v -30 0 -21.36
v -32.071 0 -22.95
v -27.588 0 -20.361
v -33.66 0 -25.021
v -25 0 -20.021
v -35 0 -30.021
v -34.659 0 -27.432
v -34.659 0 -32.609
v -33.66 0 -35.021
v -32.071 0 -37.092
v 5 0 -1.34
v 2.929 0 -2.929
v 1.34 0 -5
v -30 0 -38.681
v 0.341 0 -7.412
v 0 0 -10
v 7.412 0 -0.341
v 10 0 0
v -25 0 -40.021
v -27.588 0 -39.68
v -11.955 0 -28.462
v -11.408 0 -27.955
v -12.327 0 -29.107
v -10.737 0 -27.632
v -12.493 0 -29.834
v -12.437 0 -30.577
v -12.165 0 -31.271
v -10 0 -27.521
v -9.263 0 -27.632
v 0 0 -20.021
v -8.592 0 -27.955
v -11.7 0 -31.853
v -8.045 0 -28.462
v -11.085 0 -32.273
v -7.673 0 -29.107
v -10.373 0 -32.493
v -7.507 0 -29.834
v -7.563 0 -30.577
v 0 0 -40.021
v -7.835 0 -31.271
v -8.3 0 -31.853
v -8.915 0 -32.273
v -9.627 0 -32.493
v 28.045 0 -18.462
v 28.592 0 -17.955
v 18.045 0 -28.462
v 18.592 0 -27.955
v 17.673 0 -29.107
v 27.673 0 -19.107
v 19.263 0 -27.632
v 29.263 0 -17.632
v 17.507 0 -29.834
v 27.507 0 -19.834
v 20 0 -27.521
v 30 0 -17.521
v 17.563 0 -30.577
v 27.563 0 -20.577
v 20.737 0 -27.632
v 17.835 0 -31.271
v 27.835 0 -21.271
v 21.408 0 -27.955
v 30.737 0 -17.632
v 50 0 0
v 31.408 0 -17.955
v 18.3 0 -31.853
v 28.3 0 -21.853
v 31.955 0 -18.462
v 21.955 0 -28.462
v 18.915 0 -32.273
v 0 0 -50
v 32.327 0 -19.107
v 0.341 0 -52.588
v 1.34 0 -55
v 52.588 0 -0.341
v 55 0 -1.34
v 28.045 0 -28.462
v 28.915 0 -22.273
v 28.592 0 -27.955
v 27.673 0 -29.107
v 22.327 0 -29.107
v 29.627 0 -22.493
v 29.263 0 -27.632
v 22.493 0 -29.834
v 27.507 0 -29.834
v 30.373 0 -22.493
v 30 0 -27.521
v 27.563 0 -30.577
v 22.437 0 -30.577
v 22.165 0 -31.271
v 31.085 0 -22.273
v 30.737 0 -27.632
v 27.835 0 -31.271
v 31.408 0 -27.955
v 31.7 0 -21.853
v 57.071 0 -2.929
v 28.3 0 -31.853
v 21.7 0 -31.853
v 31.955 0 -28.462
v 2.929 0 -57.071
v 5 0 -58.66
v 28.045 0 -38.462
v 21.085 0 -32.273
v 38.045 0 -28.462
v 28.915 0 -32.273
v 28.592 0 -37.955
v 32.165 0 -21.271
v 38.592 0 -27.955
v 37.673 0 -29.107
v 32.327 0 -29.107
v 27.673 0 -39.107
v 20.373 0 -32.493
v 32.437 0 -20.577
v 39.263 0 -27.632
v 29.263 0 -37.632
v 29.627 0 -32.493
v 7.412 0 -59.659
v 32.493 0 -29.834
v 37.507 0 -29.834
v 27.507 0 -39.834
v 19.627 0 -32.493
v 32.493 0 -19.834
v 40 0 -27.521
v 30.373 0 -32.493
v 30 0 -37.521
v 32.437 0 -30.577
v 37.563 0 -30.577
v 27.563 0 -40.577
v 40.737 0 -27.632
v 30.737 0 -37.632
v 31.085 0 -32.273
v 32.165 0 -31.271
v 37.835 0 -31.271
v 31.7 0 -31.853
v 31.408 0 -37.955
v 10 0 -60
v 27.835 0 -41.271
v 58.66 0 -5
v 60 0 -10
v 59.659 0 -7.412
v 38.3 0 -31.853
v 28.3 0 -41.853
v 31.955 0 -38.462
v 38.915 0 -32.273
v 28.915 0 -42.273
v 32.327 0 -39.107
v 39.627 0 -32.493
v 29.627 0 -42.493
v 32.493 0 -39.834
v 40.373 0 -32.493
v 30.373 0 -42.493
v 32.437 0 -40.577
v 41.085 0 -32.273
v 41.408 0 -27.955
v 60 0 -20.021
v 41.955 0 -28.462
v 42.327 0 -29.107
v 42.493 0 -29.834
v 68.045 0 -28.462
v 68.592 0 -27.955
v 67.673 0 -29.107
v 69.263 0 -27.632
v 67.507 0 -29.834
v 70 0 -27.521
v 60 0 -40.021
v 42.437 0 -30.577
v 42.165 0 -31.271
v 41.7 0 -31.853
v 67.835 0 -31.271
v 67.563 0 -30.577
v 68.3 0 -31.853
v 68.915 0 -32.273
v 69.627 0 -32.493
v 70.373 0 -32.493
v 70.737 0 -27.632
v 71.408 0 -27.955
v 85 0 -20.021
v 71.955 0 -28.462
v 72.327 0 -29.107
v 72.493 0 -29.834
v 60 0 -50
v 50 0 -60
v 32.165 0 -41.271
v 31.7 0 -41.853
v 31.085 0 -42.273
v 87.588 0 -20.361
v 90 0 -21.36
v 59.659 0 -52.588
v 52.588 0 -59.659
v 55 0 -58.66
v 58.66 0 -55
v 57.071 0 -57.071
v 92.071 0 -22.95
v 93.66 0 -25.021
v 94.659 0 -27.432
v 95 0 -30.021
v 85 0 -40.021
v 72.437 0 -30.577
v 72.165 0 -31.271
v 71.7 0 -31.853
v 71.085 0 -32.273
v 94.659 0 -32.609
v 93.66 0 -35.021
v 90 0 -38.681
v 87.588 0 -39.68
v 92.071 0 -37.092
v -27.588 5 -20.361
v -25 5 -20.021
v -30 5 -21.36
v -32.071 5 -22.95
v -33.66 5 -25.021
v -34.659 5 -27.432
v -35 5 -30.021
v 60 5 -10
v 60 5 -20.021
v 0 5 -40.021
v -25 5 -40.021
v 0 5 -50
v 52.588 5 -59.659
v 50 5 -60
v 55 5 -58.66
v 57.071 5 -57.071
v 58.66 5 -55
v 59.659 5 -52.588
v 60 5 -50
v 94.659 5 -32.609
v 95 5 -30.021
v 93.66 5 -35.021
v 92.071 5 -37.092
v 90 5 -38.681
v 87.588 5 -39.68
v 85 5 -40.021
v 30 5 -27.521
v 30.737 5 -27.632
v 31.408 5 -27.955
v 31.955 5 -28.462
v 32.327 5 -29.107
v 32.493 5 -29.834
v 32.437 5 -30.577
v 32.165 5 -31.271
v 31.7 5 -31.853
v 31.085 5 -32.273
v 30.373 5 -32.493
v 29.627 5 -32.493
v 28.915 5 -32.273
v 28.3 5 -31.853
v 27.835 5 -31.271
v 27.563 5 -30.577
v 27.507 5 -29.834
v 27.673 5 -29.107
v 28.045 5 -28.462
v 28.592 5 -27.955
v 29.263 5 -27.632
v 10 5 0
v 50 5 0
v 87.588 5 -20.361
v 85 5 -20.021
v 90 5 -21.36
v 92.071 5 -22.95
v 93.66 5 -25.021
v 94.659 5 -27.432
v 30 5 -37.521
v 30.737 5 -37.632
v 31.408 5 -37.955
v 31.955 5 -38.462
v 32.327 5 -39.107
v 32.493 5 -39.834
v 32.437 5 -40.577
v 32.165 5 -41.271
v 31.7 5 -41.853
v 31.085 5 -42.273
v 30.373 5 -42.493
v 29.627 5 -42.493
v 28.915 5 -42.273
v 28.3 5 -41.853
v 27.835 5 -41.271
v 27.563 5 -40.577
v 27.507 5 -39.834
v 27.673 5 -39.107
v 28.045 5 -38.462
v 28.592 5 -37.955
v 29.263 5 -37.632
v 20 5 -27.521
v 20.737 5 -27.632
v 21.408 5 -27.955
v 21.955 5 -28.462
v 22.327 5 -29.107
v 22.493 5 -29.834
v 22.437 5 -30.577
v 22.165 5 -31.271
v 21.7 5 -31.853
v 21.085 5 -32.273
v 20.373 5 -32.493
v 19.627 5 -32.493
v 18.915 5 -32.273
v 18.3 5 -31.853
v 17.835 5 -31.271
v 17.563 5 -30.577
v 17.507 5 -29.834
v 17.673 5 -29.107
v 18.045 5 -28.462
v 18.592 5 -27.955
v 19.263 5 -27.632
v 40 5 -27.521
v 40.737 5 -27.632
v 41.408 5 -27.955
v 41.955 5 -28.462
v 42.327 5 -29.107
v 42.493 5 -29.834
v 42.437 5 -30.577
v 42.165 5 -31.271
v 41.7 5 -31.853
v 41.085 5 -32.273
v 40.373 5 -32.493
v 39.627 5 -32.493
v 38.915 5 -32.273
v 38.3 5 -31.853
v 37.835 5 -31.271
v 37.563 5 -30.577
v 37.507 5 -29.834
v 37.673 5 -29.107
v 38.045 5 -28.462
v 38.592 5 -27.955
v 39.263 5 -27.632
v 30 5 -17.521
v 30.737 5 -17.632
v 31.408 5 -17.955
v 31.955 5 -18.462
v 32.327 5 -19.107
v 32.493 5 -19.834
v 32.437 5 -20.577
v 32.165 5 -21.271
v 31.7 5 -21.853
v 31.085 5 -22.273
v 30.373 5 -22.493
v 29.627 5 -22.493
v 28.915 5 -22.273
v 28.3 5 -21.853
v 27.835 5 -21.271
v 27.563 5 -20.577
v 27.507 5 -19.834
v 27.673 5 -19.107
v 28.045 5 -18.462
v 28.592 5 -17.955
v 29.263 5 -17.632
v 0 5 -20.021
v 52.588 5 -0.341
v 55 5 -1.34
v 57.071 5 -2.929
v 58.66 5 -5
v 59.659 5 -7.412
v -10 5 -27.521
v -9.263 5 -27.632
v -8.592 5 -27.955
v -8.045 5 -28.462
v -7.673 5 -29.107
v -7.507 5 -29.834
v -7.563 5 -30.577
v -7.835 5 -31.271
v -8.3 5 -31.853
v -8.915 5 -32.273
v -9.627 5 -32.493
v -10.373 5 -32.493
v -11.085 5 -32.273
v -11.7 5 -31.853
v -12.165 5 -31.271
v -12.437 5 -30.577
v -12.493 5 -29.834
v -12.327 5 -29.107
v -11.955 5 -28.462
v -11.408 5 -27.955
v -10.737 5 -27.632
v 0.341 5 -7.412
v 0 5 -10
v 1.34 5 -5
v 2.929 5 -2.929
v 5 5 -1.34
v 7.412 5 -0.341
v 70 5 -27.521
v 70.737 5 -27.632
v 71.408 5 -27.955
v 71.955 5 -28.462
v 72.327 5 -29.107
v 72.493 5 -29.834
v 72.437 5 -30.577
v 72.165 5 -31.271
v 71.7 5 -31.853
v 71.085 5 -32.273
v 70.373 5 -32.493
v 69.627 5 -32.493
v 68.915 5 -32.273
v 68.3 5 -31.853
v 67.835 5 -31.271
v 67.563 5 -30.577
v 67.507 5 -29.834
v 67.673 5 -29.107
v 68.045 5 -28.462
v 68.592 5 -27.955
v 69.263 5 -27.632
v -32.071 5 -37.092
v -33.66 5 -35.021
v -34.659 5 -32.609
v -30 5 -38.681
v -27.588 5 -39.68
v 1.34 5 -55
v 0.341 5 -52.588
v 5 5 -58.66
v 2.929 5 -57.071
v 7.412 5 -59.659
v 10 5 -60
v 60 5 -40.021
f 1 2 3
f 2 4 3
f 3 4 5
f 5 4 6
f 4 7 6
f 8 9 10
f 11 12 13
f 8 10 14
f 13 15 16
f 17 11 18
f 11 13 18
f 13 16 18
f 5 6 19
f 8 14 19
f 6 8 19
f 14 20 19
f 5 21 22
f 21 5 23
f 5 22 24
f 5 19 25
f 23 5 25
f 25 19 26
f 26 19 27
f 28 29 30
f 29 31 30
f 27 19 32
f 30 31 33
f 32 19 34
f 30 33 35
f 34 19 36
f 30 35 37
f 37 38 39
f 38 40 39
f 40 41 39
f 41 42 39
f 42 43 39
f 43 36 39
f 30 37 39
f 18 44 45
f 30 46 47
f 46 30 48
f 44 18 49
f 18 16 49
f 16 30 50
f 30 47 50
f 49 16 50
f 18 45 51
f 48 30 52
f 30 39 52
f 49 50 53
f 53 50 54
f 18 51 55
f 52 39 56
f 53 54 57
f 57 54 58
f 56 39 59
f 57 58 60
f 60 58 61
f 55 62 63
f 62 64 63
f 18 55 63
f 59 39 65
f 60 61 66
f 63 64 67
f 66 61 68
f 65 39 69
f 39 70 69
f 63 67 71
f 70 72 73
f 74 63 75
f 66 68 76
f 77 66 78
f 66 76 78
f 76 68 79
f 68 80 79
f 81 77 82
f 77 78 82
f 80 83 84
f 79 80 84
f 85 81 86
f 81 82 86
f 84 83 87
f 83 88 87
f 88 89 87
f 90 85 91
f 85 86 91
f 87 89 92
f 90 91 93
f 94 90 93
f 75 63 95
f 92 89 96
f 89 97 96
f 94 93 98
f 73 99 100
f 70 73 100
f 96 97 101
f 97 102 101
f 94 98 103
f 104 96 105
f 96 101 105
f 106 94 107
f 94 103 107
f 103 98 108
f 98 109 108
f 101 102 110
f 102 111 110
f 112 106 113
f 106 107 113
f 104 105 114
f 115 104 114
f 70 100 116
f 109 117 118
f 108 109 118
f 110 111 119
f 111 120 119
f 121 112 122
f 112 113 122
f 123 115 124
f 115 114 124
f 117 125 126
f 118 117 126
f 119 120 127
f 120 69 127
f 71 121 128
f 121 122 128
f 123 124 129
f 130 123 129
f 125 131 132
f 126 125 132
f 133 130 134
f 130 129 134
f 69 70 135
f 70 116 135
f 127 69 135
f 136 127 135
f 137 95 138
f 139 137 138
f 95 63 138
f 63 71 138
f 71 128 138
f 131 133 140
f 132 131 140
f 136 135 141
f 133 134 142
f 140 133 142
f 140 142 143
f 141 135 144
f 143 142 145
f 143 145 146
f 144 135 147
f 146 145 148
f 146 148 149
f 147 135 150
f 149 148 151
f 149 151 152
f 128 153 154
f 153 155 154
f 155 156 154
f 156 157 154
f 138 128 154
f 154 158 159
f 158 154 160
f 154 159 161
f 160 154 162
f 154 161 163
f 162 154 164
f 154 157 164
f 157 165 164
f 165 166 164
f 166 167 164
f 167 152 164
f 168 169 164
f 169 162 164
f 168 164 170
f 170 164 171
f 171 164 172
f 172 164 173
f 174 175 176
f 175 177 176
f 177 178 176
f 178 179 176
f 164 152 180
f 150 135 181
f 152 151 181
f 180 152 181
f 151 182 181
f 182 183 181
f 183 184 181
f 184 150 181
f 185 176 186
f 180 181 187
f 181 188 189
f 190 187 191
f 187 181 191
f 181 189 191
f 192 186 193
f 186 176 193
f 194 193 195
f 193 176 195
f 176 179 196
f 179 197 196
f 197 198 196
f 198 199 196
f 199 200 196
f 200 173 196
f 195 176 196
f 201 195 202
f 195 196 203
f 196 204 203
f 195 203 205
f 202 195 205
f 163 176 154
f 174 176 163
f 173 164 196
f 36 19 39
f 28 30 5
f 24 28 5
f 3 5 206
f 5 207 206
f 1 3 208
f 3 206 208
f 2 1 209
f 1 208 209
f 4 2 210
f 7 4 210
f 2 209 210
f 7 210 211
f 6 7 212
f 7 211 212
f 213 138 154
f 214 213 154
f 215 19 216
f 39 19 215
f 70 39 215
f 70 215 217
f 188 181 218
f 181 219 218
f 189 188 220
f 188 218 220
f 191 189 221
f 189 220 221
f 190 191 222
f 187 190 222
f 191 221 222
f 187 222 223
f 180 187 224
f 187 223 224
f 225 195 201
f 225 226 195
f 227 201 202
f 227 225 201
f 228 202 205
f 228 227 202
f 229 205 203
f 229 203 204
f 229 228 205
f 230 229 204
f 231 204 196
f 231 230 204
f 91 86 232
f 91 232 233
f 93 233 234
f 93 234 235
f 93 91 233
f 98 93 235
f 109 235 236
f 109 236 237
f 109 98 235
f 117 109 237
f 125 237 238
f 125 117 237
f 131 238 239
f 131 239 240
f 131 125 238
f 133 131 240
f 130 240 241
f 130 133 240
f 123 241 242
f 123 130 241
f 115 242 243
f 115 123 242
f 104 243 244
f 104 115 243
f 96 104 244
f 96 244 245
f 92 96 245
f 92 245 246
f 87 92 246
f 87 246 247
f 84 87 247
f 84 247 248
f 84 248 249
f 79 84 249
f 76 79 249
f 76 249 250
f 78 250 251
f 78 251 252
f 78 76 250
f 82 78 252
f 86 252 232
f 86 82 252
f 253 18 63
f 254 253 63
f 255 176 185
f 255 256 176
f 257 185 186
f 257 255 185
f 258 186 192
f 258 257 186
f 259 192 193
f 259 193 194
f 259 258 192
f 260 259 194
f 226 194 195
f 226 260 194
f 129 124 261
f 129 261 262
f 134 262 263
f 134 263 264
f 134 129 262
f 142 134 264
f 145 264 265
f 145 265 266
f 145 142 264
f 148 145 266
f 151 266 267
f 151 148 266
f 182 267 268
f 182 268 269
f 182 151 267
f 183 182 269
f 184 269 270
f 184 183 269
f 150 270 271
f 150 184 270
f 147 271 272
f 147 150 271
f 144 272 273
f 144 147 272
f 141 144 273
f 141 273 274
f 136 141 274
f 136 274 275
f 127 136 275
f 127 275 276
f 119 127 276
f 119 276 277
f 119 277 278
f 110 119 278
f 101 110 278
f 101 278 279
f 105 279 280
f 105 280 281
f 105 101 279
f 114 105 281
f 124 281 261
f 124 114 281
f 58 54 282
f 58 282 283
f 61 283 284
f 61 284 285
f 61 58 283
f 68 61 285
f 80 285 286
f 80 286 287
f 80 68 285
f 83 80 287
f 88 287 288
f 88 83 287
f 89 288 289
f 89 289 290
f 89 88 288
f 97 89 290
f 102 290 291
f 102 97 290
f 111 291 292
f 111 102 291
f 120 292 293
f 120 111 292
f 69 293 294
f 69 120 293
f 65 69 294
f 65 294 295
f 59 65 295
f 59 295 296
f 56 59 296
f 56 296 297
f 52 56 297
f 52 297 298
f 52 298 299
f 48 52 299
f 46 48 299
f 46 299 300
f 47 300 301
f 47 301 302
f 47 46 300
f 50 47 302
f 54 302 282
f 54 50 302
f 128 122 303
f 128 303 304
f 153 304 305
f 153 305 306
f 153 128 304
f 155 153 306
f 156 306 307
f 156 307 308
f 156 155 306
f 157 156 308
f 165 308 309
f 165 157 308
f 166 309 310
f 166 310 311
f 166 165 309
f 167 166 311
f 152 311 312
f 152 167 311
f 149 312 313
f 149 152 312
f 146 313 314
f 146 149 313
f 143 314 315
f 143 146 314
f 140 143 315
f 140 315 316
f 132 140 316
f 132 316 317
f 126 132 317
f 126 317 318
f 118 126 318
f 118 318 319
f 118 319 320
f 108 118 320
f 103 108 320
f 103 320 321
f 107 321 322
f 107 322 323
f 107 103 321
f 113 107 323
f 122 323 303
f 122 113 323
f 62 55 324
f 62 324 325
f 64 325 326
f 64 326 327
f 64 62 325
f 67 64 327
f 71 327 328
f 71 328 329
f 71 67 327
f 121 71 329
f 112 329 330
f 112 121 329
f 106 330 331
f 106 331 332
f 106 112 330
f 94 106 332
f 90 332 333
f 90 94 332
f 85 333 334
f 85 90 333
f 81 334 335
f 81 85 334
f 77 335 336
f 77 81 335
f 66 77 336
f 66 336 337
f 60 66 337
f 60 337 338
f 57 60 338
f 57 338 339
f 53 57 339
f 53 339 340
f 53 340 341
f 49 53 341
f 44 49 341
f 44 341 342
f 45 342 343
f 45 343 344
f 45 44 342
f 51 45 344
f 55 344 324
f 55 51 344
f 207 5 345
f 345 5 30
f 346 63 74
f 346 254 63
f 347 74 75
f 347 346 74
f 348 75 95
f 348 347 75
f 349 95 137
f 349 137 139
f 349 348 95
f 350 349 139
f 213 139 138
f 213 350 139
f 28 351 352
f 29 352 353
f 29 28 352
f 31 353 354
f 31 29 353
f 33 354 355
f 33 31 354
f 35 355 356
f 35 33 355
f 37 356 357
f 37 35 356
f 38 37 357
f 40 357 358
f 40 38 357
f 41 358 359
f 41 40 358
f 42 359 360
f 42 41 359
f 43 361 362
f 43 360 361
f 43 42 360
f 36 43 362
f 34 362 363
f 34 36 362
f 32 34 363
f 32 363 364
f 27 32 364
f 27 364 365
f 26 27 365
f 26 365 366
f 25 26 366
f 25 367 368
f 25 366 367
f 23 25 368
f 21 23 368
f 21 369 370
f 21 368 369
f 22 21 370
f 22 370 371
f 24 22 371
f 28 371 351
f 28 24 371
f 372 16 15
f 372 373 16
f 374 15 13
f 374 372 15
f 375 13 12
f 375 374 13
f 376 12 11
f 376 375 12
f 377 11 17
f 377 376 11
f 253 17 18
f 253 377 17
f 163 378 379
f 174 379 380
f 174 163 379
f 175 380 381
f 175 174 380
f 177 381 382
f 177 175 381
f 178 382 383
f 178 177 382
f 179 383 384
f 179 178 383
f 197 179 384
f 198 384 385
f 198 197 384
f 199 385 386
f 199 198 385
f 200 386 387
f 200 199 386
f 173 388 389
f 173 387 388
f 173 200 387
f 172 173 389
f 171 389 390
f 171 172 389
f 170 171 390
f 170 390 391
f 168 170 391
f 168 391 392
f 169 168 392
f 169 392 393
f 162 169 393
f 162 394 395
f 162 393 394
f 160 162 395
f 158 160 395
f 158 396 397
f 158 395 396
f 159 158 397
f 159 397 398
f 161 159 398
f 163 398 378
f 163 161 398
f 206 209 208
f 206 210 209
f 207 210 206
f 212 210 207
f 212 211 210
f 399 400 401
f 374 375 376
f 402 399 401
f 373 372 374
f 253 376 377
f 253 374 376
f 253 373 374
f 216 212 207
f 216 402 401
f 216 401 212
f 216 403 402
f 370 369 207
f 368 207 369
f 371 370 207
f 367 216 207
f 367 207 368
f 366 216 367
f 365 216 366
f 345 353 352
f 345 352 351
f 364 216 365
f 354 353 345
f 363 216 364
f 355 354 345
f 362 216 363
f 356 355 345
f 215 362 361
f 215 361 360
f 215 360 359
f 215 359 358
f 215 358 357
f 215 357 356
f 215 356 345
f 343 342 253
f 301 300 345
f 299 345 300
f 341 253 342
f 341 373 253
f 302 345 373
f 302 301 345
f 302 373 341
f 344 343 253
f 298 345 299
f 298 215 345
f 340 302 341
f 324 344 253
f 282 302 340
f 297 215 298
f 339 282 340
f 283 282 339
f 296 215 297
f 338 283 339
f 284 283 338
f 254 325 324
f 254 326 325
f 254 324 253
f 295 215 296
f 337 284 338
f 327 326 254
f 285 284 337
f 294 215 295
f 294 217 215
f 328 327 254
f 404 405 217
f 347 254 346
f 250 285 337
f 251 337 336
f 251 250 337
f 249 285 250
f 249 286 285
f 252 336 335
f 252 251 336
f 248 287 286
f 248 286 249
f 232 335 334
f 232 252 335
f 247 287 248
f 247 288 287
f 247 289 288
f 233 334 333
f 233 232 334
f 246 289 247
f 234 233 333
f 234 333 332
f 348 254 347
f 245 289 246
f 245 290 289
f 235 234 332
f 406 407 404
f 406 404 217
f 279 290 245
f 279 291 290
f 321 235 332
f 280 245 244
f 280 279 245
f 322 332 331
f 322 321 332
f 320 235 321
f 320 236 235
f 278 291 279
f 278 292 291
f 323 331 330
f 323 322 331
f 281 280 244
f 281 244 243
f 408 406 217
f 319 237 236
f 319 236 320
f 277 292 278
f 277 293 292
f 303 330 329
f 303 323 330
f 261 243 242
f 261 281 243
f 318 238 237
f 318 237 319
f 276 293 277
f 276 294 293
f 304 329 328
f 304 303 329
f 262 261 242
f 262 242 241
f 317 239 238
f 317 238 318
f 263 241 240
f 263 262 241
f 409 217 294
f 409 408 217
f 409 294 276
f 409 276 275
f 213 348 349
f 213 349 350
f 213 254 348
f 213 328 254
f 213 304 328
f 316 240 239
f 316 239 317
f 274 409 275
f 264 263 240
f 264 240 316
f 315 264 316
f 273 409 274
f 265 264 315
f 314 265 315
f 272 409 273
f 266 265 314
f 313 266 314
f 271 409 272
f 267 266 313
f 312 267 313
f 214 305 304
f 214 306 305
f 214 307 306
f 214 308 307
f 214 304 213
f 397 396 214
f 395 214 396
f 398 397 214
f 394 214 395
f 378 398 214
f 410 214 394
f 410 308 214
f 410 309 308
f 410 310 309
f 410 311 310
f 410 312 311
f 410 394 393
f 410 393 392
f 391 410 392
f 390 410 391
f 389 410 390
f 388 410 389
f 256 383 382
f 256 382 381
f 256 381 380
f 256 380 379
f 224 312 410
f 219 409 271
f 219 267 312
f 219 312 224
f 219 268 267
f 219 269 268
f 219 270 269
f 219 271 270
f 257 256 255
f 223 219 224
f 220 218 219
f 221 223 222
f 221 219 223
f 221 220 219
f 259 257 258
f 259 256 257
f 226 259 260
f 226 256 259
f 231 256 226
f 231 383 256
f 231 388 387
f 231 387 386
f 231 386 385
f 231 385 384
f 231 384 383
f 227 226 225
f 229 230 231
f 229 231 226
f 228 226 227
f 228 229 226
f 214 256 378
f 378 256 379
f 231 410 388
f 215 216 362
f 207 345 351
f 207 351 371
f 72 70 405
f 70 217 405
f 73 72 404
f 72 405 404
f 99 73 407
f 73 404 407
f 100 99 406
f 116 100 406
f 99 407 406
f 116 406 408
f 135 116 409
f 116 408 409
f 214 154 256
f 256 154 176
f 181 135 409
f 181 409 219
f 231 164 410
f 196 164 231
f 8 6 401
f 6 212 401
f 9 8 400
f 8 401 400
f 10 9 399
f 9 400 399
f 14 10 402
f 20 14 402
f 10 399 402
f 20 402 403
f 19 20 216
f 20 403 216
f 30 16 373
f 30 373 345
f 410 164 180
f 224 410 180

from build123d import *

# Parameters (mm, degrees)
SKETCH1_W           = 60
SKETCH1_H           = 60
SKETCH1_R           = 2.5
BOSS_EXTRUDE2_DEPTH = 5
SKETCH3_W           = 35
SKETCH3_H           = 20
BOSS_EXTRUDE3_DEPTH = 5
SKETCH5_R           = 2.5
CUT_EXTRUDE1_DEPTH  = 113.472218792
FILLET1_R           = 10
FILLET2_R           = 10
FILLET3_R           = 10


with BuildPart() as part:
    # Sketch1 → Boss-Extrude2 (new body)
    with BuildSketch(Plane(origin=(0, 0, 0), x_dir=(1, 0, 0), z_dir=(0, 1, 0))):
        with Locations((30, 30)):
            Rectangle(SKETCH1_W, SKETCH1_H)
        with Locations(Location((30, 40.020691429, 0), (0, 0, 270))):
            Circle(SKETCH1_R, mode=Mode.SUBTRACT)
        with Locations(Location((20, 30.020691429, 0), (0, 0, 270))):
            Circle(SKETCH1_R, mode=Mode.SUBTRACT)
        with Locations(Location((30, 20.020691429, 0), (0, 0, 270))):
            Circle(SKETCH1_R, mode=Mode.SUBTRACT)
        with Locations(Location((40, 30.020691429, 0), (0, 0, 270))):
            Circle(SKETCH1_R, mode=Mode.SUBTRACT)
        with Locations(Location((30, 30.020691429, 0), (0, 0, 270))):
            Circle(SKETCH1_R, mode=Mode.SUBTRACT)
    extrude(amount=BOSS_EXTRUDE2_DEPTH)

    # Sketch3 → Boss-Extrude3 (add)
    with BuildSketch(Plane(origin=(0, 0, 0), x_dir=(1, 0, 0), z_dir=(0, 1, 0))):
        with Locations((77.5, 30.020691429)):
            Rectangle(SKETCH3_W, SKETCH3_H)
        with Locations((-17.5, 30.020691429)):
            Rectangle(SKETCH3_W, SKETCH3_H)
    extrude(amount=BOSS_EXTRUDE3_DEPTH)

    # Sketch5 → Cut-Extrude1 (cut, through all)
    with BuildSketch(Plane(origin=(0, 0, 0), x_dir=(1, 0, 0), z_dir=(0, 1, 0))):
        with Locations(Location((70, 30.020691429, 0), (0, 0, 270))):
            Circle(SKETCH5_R)
        with Locations(Location((-10, 30.020691429, 0), (0, 0, 270))):
            Circle(SKETCH5_R)
    extrude(amount=CUT_EXTRUDE1_DEPTH, mode=Mode.SUBTRACT)

    # Fillet1
    fillet1_edges = [part.edges().sort_by_distance(p)[0] for p in [
        (95, 2.5, -20.020691429),
        (95, 2.5, -40.020691429),
    ]]
    fillet(fillet1_edges, radius=FILLET1_R - 0.0001)  # a hair under: the kernel refuses the full size

    # Fillet2
    fillet2_edges = [part.edges().sort_by_distance(p)[0] for p in [
        (-35, 2.5, -20.020691429),
        (-35, 2.5, -40.020691429),
    ]]
    fillet(fillet2_edges, radius=FILLET2_R - 0.0001)  # a hair under: the kernel refuses the full size

    # Fillet3
    fillet3_edges = [part.edges().sort_by_distance(p)[0] for p in [
        (0, 2.5, -60),
        (60, 2.5, -60),
        (60, 2.5, 0),
        (0, 2.5, 0),
    ]]
    fillet(fillet3_edges, radius=FILLET3_R)


solid = part.part
